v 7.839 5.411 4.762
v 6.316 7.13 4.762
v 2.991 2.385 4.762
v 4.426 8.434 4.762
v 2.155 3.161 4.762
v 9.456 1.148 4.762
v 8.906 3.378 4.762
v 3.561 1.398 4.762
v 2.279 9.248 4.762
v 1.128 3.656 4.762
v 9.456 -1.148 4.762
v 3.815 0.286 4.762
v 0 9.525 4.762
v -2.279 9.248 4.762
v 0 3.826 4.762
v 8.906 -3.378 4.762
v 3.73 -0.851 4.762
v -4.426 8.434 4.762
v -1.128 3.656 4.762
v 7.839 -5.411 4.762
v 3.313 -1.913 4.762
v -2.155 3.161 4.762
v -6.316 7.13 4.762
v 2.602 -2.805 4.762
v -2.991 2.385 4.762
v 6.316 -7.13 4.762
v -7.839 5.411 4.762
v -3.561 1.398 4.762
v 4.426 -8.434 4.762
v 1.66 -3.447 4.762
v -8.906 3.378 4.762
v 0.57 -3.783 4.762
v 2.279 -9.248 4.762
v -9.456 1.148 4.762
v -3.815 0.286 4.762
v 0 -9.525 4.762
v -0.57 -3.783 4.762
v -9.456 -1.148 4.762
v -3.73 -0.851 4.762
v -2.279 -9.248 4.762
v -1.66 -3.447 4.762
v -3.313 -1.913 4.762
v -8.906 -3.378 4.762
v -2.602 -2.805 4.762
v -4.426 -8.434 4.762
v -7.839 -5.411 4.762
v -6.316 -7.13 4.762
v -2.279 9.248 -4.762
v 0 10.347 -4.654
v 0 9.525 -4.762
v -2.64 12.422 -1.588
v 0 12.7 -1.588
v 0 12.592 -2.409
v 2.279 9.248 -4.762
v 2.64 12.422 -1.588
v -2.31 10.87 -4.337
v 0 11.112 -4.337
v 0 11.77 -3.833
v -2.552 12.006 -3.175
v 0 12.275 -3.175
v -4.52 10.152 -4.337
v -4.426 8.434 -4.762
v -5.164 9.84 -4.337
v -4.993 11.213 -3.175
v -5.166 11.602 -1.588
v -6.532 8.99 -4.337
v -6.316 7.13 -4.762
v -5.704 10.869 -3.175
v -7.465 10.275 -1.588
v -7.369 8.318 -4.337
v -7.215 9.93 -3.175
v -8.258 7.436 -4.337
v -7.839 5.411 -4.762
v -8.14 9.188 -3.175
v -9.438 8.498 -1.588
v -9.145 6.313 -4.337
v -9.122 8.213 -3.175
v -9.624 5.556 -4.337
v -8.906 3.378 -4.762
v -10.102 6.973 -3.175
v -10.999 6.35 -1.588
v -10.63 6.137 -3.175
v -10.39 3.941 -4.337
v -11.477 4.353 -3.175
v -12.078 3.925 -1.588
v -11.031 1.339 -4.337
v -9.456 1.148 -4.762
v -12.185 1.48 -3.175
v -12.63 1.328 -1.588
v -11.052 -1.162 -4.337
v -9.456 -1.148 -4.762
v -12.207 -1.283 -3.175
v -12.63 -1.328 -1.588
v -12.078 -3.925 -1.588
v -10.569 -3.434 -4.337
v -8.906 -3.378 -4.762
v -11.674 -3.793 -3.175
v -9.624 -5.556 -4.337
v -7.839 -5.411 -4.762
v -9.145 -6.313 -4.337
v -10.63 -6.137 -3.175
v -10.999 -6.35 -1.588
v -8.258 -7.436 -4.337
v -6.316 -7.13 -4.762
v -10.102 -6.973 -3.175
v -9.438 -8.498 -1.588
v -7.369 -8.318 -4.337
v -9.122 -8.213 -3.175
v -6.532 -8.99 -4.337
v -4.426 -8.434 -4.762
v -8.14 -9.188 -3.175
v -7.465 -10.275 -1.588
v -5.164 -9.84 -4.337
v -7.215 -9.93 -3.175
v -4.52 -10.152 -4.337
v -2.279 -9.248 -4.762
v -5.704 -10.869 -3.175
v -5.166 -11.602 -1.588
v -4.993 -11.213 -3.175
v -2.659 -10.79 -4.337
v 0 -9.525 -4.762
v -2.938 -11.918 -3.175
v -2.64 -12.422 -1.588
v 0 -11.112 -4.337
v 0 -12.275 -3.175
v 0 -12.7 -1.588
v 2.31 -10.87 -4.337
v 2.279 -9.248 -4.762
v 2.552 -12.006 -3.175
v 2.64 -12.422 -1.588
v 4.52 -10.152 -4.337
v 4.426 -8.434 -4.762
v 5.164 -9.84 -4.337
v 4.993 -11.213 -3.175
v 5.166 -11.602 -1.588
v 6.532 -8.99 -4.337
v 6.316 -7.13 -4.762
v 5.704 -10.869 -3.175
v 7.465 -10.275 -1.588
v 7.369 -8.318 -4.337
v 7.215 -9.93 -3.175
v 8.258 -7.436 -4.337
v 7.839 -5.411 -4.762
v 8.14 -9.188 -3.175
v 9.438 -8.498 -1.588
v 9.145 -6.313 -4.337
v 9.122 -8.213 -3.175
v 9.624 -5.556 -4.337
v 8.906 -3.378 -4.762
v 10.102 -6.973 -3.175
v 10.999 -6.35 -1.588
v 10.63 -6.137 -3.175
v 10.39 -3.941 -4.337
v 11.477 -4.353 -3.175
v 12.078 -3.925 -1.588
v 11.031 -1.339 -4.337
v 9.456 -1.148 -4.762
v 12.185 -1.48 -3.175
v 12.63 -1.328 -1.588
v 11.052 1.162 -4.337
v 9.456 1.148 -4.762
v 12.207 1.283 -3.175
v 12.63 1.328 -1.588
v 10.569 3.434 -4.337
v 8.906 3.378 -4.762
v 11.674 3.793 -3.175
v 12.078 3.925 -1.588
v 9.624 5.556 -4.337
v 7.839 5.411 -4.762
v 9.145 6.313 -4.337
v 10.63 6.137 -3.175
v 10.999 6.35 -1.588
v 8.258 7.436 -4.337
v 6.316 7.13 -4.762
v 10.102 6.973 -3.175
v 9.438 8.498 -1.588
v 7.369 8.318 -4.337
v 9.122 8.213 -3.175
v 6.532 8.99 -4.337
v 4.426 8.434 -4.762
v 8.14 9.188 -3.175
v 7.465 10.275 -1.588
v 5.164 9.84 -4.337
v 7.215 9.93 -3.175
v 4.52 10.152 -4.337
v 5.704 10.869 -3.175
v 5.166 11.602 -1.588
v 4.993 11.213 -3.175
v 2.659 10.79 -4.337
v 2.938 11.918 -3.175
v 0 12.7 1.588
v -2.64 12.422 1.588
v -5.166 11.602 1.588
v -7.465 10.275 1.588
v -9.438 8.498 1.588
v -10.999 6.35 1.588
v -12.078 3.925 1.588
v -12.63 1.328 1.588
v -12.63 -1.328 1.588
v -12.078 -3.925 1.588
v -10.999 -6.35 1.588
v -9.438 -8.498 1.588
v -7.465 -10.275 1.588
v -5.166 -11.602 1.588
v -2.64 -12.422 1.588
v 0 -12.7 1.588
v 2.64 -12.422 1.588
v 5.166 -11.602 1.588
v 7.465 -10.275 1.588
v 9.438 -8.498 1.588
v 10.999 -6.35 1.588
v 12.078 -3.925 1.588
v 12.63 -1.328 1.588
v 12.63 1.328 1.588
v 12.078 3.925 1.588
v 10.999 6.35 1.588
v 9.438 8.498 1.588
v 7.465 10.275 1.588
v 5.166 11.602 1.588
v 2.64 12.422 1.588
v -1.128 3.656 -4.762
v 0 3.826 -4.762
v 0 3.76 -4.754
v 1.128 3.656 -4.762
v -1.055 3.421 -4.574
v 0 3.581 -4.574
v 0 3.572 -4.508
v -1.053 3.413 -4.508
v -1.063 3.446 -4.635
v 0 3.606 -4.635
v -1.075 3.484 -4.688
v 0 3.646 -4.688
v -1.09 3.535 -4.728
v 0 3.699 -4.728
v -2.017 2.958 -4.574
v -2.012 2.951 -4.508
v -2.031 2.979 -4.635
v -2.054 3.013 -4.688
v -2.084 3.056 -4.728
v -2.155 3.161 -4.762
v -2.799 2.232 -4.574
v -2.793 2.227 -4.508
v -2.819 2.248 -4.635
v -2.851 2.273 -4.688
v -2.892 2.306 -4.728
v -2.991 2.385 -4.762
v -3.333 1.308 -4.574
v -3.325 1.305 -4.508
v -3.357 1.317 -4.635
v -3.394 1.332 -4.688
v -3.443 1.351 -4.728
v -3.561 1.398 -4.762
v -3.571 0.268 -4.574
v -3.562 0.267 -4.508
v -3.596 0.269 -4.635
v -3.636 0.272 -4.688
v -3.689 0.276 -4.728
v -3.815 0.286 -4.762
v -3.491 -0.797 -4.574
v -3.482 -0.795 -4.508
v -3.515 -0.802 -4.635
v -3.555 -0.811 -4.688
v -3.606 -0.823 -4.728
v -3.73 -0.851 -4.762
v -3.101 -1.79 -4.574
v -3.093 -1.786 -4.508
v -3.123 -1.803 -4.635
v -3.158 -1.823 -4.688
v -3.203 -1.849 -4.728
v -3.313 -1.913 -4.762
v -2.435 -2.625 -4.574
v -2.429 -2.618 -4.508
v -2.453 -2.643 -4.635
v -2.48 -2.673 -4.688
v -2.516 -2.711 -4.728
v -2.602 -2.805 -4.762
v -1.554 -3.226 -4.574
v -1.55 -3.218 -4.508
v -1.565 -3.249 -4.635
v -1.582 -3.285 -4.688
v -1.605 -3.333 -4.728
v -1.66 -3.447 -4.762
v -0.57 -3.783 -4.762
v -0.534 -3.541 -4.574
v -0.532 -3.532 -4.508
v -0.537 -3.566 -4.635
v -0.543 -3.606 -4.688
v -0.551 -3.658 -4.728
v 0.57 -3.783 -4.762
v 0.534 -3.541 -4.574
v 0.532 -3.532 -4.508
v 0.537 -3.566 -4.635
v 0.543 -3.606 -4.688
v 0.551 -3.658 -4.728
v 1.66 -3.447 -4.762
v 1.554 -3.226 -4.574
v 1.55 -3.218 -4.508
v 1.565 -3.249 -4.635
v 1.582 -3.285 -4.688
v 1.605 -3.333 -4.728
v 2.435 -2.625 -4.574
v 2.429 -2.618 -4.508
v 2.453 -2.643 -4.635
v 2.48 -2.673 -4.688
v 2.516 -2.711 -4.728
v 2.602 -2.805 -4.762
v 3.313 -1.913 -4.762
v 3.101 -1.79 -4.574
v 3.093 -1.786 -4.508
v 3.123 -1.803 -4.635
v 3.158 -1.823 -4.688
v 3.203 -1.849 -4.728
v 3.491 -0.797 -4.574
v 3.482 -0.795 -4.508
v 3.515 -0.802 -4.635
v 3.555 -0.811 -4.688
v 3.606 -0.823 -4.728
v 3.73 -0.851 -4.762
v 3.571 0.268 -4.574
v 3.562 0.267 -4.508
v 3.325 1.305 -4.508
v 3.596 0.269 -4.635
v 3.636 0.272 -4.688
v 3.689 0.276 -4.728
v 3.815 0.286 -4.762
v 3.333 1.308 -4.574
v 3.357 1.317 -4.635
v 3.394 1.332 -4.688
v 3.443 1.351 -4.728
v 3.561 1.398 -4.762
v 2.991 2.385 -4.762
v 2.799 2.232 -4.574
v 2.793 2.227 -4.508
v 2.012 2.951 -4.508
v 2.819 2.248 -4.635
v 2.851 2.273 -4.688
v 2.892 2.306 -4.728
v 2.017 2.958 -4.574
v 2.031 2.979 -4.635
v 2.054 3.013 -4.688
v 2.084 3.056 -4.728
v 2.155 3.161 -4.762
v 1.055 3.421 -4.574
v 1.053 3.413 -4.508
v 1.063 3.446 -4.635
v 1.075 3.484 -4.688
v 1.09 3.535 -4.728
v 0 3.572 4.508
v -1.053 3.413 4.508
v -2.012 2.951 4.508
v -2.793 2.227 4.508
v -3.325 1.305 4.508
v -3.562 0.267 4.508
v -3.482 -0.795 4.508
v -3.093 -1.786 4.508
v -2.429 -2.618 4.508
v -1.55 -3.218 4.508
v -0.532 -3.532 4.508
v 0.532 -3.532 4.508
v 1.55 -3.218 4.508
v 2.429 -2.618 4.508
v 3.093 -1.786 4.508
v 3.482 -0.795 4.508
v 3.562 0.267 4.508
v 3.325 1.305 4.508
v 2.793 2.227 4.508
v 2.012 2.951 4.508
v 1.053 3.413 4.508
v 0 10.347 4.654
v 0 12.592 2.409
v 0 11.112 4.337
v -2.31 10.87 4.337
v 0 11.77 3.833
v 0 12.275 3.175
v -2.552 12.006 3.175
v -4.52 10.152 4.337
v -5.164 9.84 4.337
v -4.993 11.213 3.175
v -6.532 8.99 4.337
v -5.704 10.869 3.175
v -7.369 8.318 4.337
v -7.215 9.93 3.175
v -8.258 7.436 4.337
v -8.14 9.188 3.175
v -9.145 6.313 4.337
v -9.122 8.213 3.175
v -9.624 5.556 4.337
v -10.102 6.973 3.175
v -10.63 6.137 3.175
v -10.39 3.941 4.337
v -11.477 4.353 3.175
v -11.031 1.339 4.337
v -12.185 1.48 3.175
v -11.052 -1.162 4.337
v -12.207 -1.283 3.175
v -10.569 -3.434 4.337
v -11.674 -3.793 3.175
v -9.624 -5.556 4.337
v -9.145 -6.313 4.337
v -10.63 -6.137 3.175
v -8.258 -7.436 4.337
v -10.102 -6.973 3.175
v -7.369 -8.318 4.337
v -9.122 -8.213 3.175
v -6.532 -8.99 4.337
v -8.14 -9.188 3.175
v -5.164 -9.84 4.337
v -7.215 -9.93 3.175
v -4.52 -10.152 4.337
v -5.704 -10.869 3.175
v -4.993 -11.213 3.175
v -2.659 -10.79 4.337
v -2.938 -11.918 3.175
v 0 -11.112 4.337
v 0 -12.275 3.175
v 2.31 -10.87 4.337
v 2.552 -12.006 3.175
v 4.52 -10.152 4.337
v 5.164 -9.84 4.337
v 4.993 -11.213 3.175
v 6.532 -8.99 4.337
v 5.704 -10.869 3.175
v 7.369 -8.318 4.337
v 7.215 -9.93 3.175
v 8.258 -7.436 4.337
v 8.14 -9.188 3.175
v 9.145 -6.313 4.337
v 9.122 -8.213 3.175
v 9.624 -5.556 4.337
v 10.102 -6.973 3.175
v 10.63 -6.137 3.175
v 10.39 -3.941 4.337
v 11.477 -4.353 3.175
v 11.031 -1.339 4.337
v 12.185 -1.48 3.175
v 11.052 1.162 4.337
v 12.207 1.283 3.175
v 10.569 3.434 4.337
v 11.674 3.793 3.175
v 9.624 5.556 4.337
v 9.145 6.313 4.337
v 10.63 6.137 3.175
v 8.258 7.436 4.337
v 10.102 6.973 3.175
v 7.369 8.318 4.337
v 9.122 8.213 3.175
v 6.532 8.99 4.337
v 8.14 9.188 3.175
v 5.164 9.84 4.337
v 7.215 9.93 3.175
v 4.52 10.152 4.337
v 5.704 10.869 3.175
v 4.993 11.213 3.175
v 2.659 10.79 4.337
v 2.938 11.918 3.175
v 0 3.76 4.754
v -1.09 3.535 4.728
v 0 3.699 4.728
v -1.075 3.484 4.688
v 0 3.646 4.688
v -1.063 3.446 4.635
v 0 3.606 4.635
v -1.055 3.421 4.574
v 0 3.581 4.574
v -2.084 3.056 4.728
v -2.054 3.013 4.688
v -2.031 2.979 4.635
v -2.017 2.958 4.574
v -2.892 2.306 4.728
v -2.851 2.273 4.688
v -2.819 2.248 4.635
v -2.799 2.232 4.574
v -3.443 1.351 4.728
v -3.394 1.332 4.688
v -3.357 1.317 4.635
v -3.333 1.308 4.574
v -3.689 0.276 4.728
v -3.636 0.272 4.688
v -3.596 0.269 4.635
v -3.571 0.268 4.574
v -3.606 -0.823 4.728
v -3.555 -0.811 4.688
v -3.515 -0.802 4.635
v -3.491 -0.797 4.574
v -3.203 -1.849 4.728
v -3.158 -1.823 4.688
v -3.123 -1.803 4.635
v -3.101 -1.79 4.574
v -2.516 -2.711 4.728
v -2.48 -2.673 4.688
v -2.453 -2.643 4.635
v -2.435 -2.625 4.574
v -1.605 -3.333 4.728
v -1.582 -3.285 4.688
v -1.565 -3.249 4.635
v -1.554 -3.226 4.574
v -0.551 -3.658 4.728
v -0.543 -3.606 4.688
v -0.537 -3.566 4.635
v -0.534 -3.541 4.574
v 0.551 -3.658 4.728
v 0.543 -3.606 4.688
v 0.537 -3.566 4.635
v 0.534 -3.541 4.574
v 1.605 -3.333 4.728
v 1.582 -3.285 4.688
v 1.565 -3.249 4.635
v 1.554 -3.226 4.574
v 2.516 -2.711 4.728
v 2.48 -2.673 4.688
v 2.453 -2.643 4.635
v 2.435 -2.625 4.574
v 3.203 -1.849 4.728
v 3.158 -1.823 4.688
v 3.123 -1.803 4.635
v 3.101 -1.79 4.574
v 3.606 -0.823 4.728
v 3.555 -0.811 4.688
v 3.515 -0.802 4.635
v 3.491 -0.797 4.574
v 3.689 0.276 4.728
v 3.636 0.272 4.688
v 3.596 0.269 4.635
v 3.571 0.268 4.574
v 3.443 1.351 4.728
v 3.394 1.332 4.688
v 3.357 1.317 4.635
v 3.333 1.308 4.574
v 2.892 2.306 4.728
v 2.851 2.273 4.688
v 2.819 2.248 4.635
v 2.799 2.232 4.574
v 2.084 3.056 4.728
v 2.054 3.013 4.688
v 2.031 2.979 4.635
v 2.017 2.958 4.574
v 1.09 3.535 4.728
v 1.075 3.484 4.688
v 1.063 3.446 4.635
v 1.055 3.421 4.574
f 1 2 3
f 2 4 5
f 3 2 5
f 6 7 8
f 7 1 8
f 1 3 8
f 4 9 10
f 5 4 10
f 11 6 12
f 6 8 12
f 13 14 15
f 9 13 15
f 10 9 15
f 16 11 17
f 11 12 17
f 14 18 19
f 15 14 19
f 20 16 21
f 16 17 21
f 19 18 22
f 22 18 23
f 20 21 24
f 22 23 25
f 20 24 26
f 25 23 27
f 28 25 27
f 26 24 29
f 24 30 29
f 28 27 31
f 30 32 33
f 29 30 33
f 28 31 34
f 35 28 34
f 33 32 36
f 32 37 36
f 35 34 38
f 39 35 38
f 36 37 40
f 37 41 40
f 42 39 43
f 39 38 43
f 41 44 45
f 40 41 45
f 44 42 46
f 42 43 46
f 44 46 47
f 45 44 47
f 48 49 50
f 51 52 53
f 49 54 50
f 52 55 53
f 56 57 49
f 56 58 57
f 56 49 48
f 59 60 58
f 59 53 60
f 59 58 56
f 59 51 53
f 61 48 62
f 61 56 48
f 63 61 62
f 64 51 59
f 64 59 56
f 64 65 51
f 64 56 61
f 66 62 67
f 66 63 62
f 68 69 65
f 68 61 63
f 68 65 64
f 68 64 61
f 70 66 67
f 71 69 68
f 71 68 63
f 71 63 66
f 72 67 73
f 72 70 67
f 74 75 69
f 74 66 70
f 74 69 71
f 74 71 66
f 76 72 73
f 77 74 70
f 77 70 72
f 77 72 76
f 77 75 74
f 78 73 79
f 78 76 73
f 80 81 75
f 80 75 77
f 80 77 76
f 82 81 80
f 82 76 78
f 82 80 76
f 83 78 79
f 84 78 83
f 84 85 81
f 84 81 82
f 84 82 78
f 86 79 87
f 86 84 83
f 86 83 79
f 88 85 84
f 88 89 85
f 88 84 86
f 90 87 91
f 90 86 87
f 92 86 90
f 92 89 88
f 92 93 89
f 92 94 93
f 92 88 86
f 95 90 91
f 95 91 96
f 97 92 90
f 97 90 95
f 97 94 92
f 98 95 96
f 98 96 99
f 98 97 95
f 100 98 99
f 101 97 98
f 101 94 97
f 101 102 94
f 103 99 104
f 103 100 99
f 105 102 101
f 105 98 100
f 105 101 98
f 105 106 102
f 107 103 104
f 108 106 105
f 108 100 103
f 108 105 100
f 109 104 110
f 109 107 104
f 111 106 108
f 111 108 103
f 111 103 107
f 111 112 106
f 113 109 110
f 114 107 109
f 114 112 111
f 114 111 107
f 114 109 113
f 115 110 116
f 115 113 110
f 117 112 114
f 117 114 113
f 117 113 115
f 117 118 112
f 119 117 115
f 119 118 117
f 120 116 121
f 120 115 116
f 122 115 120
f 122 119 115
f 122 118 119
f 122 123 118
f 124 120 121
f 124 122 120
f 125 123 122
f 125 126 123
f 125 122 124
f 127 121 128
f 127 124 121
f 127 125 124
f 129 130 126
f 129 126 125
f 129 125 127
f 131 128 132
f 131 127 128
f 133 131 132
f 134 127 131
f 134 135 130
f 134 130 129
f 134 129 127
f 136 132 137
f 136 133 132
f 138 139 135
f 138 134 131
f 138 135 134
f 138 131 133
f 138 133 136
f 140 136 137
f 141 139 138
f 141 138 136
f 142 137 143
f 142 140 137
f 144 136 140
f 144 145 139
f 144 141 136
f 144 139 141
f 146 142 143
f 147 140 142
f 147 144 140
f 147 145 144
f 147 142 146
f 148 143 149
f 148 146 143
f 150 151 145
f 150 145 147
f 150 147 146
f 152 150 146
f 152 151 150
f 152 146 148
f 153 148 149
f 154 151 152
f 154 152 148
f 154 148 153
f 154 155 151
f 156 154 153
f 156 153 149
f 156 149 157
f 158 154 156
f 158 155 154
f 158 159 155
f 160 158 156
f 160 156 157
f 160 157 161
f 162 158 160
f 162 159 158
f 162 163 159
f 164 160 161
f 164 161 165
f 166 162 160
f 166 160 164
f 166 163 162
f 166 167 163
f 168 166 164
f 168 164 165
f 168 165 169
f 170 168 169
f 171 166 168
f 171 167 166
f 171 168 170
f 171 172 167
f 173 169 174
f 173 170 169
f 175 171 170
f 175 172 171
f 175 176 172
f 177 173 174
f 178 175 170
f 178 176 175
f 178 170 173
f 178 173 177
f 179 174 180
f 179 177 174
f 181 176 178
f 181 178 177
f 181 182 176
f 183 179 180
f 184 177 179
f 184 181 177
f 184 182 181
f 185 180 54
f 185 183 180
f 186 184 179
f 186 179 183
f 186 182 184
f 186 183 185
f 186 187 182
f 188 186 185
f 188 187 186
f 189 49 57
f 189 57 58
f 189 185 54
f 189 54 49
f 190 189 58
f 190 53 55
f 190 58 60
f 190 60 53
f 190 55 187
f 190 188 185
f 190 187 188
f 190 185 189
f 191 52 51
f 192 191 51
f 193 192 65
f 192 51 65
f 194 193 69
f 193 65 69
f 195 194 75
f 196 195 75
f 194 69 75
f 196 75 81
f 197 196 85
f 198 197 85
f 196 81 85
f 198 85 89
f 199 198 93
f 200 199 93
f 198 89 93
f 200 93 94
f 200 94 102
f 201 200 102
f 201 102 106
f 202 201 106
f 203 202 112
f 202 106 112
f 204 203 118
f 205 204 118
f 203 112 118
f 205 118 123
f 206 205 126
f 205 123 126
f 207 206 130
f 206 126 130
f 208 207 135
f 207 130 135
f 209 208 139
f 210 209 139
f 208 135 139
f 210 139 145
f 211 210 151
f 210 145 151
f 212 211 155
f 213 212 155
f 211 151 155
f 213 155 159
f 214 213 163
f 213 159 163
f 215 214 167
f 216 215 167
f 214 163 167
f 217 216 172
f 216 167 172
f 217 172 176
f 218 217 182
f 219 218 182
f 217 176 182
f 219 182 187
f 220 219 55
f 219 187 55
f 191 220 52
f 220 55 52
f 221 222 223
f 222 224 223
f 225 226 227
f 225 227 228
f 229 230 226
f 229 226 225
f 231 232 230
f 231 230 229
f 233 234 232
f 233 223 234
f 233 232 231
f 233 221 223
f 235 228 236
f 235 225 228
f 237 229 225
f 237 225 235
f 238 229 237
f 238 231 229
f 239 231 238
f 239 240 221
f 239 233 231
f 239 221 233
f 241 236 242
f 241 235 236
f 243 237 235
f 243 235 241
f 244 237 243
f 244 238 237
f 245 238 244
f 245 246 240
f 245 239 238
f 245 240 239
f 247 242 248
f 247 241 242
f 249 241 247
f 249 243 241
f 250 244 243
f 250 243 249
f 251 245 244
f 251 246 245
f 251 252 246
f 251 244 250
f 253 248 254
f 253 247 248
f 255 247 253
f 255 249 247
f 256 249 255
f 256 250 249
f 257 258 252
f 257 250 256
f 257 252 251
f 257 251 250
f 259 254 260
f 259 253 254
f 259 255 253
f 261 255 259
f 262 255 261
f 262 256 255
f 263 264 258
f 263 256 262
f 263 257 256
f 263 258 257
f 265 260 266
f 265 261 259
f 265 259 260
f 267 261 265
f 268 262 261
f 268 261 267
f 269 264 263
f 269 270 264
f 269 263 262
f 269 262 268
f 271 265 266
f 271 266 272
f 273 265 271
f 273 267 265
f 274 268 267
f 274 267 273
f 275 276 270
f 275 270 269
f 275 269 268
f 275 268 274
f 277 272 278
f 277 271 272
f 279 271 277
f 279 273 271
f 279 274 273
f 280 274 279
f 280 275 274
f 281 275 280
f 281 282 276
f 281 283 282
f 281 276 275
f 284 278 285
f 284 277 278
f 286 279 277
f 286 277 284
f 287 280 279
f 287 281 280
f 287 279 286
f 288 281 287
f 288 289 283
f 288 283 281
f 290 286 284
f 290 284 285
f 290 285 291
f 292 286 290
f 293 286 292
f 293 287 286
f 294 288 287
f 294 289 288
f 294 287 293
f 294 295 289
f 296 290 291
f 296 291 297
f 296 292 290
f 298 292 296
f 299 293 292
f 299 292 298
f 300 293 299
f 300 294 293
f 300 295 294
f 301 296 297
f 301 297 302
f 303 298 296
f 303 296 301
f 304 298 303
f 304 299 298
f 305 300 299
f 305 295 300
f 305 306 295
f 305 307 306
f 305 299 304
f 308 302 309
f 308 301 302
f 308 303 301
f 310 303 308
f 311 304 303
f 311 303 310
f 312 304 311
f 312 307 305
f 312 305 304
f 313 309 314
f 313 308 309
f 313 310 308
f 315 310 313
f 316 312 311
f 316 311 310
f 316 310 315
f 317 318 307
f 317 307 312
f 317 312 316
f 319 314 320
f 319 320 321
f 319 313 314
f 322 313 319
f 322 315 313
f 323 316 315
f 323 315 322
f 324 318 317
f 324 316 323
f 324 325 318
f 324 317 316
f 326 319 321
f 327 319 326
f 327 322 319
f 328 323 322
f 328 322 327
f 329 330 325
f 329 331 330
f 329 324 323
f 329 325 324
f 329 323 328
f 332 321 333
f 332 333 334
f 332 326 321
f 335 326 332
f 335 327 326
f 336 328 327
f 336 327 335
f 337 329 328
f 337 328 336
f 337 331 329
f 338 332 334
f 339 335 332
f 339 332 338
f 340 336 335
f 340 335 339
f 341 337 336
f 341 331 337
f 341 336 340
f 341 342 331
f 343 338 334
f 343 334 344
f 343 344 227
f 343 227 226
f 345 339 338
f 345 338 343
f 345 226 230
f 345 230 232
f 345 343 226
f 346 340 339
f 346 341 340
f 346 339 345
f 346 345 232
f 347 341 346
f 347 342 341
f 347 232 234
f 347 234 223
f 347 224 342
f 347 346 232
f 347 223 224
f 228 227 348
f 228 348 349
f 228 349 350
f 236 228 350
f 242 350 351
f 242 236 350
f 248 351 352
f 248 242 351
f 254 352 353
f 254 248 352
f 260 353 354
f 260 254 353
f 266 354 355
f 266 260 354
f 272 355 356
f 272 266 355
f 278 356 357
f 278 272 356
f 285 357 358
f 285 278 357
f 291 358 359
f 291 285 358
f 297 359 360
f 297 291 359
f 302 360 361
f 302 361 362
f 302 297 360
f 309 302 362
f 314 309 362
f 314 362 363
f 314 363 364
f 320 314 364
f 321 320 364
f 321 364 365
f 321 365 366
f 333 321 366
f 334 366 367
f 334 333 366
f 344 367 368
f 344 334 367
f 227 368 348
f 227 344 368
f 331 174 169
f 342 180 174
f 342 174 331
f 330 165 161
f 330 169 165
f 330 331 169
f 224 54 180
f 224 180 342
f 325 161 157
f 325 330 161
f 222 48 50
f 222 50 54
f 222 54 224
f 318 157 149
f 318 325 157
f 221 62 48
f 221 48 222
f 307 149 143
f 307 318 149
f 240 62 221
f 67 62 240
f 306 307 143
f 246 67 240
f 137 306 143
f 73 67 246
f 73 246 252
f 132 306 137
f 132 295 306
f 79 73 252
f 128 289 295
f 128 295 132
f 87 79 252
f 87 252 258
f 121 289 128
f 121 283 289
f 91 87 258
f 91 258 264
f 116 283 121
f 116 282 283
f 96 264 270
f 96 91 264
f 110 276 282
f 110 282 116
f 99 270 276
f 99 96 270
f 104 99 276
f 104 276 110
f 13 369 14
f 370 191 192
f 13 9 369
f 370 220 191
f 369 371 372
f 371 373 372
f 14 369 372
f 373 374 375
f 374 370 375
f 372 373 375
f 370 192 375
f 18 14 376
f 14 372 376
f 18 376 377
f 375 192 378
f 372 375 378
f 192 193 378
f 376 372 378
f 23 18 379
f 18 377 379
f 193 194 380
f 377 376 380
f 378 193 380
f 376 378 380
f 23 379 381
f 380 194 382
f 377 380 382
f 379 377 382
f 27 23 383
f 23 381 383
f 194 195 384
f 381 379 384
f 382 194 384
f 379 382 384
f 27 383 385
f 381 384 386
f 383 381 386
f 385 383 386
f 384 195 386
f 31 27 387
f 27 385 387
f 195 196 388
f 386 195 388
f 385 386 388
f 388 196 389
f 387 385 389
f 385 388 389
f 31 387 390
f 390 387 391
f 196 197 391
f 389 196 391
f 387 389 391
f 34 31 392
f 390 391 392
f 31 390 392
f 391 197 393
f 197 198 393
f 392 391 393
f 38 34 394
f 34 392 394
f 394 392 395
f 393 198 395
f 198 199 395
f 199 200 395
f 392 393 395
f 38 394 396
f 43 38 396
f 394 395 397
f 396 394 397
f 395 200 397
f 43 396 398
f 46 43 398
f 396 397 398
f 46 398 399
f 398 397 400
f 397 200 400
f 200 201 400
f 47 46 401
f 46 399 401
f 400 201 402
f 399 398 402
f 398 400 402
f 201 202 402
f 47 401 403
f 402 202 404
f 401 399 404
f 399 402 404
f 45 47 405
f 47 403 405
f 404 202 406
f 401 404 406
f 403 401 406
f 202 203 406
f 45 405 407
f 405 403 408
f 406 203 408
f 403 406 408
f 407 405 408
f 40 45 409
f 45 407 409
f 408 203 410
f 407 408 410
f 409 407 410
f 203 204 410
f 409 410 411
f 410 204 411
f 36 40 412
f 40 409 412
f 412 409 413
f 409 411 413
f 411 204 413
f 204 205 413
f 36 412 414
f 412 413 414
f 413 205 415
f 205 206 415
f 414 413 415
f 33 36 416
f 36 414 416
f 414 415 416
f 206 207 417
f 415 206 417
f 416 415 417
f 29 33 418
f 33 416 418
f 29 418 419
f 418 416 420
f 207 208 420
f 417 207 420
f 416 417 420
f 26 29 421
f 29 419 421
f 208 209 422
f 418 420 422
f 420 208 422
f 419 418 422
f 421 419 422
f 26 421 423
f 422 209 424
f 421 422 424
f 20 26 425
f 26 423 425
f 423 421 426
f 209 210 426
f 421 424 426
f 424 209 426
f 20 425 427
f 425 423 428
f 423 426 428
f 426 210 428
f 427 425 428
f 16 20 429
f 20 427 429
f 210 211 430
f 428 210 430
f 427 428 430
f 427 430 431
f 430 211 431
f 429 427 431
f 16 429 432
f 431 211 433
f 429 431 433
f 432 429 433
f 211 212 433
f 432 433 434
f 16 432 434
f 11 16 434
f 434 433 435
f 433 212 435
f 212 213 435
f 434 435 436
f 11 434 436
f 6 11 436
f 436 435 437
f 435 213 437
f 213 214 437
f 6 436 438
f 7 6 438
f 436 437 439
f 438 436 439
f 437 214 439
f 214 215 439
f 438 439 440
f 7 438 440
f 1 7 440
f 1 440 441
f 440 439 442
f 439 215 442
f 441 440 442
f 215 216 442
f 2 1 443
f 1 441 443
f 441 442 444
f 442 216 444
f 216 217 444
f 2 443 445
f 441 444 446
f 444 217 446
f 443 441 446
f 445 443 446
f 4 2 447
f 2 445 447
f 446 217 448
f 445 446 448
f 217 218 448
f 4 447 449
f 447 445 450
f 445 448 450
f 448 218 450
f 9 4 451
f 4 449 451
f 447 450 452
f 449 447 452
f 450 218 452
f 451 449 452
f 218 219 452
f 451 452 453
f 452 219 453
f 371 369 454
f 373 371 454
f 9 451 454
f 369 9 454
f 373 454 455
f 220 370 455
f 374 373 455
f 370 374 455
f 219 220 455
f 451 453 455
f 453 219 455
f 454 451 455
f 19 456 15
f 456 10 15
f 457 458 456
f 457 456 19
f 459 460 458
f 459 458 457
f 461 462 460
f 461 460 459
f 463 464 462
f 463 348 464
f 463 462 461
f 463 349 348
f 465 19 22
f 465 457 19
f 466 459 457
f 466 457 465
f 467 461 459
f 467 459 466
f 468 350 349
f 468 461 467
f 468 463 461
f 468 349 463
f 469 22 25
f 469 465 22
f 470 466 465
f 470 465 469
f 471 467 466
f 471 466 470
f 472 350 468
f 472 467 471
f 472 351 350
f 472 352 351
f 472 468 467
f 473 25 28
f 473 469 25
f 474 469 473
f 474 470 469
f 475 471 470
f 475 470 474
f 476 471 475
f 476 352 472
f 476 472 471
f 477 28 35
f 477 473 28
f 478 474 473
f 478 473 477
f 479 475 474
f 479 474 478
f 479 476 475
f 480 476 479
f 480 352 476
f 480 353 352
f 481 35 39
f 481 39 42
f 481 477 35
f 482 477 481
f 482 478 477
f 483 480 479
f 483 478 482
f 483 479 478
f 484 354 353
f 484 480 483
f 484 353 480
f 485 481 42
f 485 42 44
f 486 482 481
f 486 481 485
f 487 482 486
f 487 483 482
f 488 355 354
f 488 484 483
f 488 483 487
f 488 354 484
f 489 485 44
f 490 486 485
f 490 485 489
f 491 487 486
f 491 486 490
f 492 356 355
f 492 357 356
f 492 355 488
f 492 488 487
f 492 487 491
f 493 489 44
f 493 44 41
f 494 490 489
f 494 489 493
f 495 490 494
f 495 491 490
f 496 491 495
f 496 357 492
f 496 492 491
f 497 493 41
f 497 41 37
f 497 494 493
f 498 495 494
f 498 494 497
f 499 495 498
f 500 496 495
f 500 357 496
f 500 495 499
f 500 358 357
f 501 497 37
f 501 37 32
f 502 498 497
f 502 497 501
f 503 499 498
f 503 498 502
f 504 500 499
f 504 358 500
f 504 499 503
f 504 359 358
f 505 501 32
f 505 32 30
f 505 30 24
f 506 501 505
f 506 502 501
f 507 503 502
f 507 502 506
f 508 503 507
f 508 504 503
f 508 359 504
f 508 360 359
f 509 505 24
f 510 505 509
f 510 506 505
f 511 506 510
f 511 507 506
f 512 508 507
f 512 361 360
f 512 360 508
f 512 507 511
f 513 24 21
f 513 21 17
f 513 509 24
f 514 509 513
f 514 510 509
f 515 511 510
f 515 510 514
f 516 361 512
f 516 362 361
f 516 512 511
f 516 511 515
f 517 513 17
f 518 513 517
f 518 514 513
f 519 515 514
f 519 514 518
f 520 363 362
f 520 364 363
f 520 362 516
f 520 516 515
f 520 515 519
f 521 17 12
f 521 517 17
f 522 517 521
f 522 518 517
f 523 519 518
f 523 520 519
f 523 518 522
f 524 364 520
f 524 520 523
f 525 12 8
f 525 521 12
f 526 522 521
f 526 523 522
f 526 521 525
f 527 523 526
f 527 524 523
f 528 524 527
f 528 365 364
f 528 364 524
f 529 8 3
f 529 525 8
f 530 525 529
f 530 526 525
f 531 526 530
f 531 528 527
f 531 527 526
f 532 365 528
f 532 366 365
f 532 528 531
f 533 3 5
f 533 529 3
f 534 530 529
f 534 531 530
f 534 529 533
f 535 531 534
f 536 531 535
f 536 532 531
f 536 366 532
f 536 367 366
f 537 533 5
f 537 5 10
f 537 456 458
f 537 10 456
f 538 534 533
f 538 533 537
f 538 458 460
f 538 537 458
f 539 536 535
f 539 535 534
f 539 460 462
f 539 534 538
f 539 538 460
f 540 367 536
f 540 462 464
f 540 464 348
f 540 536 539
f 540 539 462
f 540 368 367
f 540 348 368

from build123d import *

# Parameters (mm, degrees)
SKETCH1_W = 9.525
SKETCH1_H = 9.128125
FILLET1_R = 3.175
FILLET2_R = 0.254


with BuildPart() as part:
    # Sketch1 → Revolve1 (revolve)
    with BuildSketch(Plane(origin=(0, 0, 0), x_dir=(0, 0, -1), z_dir=(1, 0, 0))):
        with Locations((0, 8.1359375)):
            Rectangle(SKETCH1_W, SKETCH1_H)
    revolve(axis=Axis((0, 0, 0), (0, 0, 1)))

    # Fillet1
    fillet1_edges = [part.edges().sort_by_distance(p)[0] for p in [
        (0, -12.7, 4.7625),
        (0, -12.7, -4.7625),
    ]]
    fillet(fillet1_edges, radius=FILLET1_R)

    # Fillet2
    fillet2_edges = [part.edges().sort_by_distance(p)[0] for p in [
        (0, -3.571875, -4.7625),
        (0, -3.571875, 4.7625),
    ]]
    fillet(fillet2_edges, radius=FILLET2_R)


solid = part.part
